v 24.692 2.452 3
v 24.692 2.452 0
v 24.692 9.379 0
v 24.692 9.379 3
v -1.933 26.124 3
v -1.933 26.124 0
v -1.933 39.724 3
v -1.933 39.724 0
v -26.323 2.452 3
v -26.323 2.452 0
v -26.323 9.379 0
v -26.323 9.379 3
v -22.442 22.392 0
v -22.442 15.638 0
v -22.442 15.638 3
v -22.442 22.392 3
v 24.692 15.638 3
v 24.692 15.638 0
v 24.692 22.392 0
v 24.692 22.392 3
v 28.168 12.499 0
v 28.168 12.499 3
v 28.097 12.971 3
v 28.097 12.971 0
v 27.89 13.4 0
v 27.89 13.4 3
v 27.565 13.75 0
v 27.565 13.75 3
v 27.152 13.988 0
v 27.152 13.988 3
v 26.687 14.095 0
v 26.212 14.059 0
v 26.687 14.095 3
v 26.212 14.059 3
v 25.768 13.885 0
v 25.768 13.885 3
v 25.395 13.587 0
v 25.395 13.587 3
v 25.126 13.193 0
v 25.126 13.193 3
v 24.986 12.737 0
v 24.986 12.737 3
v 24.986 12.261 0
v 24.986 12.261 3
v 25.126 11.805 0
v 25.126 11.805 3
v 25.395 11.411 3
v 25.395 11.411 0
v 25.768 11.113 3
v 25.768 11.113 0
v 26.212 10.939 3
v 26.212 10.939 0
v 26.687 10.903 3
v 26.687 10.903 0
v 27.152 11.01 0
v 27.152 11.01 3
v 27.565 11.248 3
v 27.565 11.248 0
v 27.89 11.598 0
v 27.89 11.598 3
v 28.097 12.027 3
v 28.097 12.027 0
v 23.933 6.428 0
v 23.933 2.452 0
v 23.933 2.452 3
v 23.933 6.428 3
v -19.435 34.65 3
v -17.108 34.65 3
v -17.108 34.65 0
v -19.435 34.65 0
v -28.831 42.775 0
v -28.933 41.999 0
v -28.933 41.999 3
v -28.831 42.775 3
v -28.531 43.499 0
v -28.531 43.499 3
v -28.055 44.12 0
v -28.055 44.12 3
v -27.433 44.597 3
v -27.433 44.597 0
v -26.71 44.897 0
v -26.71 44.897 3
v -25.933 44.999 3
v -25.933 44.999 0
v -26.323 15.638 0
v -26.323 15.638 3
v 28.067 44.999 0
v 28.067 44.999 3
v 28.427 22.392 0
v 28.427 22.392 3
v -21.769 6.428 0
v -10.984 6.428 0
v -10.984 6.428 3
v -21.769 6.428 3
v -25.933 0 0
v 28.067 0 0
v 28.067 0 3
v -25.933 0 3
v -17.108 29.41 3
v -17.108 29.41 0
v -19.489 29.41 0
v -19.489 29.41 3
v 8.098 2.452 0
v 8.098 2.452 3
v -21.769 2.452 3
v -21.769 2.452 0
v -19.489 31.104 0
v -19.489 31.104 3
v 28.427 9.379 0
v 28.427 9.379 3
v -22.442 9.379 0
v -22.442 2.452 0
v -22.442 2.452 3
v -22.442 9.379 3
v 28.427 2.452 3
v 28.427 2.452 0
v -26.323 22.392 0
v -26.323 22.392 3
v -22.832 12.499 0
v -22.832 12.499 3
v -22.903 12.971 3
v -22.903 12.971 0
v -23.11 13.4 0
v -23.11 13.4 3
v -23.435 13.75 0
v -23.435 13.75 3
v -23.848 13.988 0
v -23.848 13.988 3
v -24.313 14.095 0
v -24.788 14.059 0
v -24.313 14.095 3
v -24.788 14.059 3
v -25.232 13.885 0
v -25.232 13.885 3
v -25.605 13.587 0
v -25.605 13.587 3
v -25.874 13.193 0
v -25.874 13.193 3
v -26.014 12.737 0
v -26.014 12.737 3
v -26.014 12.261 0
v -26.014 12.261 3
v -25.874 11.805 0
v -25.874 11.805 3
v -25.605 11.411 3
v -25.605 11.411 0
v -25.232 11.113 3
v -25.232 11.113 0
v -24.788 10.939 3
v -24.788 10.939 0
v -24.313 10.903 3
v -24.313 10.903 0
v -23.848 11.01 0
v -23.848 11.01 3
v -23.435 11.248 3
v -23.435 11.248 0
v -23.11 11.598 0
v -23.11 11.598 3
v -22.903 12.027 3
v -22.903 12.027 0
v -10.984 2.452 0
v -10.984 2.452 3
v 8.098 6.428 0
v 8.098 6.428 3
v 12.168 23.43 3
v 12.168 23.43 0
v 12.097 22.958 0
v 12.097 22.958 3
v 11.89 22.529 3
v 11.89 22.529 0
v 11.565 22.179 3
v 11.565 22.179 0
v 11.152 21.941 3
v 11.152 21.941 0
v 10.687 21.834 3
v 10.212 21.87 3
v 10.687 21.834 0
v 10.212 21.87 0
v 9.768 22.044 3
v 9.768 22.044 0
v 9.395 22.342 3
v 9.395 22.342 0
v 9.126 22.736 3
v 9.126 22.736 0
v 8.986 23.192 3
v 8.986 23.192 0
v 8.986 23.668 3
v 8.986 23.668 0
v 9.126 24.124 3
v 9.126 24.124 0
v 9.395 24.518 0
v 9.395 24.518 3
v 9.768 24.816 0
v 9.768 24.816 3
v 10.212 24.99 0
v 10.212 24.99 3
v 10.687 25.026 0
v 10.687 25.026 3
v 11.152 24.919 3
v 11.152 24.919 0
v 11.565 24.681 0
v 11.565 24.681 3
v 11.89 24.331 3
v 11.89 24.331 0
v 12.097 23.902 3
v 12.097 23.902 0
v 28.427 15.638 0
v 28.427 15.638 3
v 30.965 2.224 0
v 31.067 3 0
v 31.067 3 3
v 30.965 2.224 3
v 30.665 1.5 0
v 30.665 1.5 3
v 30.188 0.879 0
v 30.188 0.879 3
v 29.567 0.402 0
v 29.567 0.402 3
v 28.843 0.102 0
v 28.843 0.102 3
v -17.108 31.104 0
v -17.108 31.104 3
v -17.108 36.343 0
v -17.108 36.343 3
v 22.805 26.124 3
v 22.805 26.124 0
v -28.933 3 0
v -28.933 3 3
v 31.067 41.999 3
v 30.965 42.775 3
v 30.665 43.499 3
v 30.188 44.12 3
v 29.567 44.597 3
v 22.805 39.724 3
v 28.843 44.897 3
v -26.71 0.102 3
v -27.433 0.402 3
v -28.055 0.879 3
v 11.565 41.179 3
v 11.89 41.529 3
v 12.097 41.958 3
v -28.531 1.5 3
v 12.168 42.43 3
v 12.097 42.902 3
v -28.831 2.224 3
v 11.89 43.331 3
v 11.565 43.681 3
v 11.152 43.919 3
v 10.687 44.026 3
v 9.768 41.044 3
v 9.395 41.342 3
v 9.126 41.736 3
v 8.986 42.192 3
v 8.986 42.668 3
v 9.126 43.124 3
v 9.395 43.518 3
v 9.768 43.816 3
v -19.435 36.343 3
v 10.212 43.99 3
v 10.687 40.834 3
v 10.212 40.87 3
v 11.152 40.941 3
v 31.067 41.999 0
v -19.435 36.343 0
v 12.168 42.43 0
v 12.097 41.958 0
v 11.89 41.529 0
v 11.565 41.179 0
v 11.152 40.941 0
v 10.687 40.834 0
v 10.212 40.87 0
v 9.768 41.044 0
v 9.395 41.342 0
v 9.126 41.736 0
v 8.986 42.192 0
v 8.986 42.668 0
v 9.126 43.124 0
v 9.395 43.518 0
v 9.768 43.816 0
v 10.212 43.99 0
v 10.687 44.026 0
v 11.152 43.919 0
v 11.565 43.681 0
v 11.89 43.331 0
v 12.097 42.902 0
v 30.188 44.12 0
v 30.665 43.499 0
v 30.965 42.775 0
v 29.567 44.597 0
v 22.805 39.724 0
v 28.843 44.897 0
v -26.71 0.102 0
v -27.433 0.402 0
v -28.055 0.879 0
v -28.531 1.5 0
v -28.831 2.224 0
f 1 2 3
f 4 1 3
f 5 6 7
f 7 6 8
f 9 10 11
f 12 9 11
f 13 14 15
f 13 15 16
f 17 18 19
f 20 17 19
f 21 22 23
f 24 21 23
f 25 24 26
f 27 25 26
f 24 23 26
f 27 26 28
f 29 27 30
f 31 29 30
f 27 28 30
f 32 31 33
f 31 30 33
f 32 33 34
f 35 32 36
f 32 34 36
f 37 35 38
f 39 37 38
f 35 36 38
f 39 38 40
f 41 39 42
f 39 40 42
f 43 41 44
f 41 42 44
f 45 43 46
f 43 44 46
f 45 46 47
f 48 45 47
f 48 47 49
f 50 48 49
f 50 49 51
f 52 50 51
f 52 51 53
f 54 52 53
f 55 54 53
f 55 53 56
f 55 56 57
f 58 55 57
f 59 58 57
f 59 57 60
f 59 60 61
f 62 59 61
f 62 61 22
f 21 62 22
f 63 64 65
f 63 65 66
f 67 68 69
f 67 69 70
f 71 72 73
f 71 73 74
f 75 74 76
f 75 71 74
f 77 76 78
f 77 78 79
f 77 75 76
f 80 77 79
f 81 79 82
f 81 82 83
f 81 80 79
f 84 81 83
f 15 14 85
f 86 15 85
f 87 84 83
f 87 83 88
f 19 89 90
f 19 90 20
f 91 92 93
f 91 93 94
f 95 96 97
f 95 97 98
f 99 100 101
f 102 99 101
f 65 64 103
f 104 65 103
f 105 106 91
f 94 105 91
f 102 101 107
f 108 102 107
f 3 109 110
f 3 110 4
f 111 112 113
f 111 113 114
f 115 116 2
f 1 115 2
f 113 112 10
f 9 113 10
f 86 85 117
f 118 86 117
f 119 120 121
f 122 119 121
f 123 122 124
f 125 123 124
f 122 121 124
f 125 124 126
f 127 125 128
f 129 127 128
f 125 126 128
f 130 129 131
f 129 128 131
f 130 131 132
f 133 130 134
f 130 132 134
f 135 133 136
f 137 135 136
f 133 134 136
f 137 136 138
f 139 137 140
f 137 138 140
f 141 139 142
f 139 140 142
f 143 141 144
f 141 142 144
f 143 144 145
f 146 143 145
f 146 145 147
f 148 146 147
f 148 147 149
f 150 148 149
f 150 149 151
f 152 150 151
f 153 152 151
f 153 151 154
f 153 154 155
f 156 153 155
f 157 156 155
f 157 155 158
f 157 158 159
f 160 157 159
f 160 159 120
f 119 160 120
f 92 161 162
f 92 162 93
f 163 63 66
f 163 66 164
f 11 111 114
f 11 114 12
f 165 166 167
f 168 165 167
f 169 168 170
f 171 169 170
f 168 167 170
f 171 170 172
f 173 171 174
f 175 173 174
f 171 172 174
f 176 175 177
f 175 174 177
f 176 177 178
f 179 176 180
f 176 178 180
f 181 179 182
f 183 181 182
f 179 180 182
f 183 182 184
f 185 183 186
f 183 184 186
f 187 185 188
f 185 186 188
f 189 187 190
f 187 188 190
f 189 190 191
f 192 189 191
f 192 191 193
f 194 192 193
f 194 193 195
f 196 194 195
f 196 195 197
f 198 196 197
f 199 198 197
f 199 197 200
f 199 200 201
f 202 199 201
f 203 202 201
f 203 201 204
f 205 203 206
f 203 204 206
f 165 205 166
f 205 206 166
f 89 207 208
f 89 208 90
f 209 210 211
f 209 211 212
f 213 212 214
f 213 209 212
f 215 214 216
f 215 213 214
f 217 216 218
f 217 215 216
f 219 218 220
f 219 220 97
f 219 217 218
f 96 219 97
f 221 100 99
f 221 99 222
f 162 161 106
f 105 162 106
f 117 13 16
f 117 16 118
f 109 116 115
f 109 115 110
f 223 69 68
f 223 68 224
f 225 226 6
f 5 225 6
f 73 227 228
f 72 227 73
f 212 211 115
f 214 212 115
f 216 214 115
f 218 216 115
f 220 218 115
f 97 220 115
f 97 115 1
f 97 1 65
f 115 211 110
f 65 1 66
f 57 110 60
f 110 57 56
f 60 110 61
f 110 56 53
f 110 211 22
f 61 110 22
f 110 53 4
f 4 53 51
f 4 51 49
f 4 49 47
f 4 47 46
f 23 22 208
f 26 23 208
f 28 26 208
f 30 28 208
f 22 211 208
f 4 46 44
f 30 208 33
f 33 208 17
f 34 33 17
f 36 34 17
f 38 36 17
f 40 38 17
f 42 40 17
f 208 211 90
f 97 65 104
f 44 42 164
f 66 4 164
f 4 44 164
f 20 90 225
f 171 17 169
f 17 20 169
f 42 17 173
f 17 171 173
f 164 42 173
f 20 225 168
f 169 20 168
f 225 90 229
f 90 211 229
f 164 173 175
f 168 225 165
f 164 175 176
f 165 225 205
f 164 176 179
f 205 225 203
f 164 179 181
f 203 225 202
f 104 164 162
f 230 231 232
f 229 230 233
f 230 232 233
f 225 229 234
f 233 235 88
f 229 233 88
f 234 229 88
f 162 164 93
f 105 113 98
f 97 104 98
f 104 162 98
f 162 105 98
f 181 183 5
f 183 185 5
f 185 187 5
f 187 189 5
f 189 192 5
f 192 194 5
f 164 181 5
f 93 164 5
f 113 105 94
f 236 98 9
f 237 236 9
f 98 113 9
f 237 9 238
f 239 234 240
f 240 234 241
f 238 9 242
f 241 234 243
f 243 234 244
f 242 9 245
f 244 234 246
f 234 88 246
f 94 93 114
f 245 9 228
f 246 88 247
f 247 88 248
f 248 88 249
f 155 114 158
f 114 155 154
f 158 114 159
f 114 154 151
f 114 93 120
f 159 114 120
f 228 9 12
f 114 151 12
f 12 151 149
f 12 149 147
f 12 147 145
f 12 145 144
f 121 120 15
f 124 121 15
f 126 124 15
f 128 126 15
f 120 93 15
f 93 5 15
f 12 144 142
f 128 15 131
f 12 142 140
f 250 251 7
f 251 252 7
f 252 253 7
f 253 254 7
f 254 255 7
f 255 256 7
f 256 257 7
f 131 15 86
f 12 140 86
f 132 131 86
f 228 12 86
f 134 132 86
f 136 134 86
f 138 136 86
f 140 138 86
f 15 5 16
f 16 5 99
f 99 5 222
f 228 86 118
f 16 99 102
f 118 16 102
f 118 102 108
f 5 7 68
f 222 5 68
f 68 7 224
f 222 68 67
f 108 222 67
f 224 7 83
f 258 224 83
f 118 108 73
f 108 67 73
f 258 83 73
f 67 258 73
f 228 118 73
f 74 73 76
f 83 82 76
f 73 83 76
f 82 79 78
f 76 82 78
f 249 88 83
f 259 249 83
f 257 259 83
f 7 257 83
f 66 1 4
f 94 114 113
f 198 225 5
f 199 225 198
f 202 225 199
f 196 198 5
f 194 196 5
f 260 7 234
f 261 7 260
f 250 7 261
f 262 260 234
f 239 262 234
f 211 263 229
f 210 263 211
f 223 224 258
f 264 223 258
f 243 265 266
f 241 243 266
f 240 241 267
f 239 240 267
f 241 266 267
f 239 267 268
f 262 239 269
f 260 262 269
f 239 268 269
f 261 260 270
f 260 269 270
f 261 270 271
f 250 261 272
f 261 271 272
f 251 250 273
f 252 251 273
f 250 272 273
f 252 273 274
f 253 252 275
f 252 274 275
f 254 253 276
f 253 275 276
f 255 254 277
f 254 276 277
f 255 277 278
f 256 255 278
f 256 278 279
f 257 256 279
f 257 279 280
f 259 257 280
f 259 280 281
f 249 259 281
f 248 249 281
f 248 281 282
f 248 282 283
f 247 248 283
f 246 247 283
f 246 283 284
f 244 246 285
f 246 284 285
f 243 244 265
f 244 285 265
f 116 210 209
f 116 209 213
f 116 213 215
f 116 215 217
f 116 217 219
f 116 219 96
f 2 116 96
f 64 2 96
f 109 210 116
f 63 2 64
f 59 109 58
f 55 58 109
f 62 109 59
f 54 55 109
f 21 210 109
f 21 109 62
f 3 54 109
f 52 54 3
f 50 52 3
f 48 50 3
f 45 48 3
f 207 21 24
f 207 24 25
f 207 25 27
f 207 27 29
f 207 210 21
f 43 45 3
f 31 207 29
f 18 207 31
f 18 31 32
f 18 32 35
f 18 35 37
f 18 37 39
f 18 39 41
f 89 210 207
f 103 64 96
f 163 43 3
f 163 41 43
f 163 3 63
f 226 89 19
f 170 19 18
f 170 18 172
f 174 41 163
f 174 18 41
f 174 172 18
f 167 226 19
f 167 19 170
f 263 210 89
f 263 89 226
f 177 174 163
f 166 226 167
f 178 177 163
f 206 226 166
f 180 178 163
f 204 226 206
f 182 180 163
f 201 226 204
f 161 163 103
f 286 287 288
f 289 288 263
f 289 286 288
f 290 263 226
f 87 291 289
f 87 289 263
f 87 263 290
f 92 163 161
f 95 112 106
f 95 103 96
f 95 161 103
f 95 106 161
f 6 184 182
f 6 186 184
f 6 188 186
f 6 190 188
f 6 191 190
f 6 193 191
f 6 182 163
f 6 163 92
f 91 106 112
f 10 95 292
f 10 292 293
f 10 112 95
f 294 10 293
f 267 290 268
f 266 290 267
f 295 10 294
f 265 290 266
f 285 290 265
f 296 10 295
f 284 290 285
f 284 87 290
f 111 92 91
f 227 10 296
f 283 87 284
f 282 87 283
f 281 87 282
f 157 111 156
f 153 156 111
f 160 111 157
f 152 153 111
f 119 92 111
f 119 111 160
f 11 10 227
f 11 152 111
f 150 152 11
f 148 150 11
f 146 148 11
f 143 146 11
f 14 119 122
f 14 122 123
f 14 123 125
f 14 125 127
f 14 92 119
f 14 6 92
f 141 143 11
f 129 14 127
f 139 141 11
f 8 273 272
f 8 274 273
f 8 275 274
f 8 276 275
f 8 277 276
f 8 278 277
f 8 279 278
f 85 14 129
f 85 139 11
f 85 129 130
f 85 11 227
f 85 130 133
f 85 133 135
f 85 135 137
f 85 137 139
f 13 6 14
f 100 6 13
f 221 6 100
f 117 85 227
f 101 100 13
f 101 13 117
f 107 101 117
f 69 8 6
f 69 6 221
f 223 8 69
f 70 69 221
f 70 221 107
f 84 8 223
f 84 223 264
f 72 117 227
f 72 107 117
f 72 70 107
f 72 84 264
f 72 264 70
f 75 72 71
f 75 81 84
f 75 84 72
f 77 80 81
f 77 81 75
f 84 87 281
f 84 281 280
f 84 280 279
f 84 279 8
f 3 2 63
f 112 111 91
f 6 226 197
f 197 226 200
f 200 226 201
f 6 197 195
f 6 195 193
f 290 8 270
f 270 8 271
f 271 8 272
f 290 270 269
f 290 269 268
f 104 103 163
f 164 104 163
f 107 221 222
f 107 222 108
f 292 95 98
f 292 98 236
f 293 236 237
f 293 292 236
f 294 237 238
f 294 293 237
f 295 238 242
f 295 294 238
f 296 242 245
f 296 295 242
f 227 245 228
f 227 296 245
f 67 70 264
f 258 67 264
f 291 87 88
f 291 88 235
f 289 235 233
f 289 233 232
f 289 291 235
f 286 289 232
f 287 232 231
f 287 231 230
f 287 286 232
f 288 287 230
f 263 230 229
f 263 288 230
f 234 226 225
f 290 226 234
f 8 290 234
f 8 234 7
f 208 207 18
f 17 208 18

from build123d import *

# Parameters (mm, degrees)
SKETCH_1_R          = 1.35
SKETCH_1_R_2        = 1.6
SKETCH_1_W          = 10.785023523
SKETCH_1_H          = 3.975869969
SKETCH_1_W_2        = 3.881137471
SKETCH_1_H_2        = 6.926362959
SKETCH_1_H_3        = 6.753909589
SKETCH_1_W_3        = 2.381
SKETCH_1_H_4        = 1.694
SKETCH_1_W_4        = 2.327
SKETCH_1_H_5        = 1.693
SKETCH_1_W_5        = 24.737091535
SKETCH_1_H_6        = 13.600314953
SKETCH_1_W_6        = 15.83465493
SKETCH_1_W_7        = 3.735479659
EXTRUDE_1_DEPTH     = 3
SKETCH_2_R          = 1.6
CUT_EXTRUDE_1_DEPTH = 55.763647529


with BuildPart() as part:
    # 草图1 → 凸台-拉伸1 (new body)
    with BuildSketch(Plane(origin=(0, 0, 0), x_dir=(-1, 0, 0), z_dir=(0, 0, -1))):
        with BuildLine():
            Line((28.933183464, 3), (28.933183464, 41.999))
            ThreePointArc((28.933183464, 41.999), (28.054503808, 44.120320344), (25.933183464, 44.999))
            Line((25.933183464, 44.999), (-28.066816536, 44.999))
            ThreePointArc((-28.066816536, 44.999), (-30.18813688, 44.120320344), (-31.066816536, 41.999))
            Line((-31.066816536, 41.999), (-31.066816536, 3))
            ThreePointArc((-31.066816536, 3), (-30.18813688, 0.878679656), (-28.066816536, 0))
            Line((-28.066816536, 0), (25.933183464, 0))
            ThreePointArc((25.933183464, 0), (28.054503808, 0.878679656), (28.933183464, 3))
        make_face()
        with Locations(Location((-26.567767322, 12.499, 0), (0, 0, 180))):
            Circle(SKETCH_1_R, mode=Mode.SUBTRACT)
        with Locations(Location((-10.567816536, 23.43, 0), (0, 0, 180))):
            Circle(SKETCH_1_R_2, mode=Mode.SUBTRACT)
        with Locations(Location((24.432183464, 12.499, 0), (0, 0, 180))):
            Circle(SKETCH_1_R, mode=Mode.SUBTRACT)
        with Locations(Location((-10.567816536, 42.43, 0), (0, 0, 180))):
            Circle(SKETCH_1_R_2, mode=Mode.SUBTRACT)
        with Locations((16.376273559, 4.440236649)):
            Rectangle(SKETCH_1_W, SKETCH_1_H, mode=Mode.SUBTRACT)
        with Locations((24.382587874, 5.915483144)):
            Rectangle(SKETCH_1_W_2, SKETCH_1_H_2, mode=Mode.SUBTRACT)
        with Locations((24.382587874, 19.014796064)):
            Rectangle(SKETCH_1_W_2, SKETCH_1_H_3, mode=Mode.SUBTRACT)
        with Locations((18.298683464, 30.257)):
            Rectangle(SKETCH_1_W_3, SKETCH_1_H_4, mode=Mode.SUBTRACT)
        with Locations((18.271683464, 35.4965)):
            Rectangle(SKETCH_1_W_4, SKETCH_1_H_5, mode=Mode.SUBTRACT)
        with Locations((-10.43601502, 32.923896791)):
            Rectangle(SKETCH_1_W_5, SKETCH_1_H_6, mode=Mode.SUBTRACT)
        with Locations((-16.015517123, 4.440236649)):
            Rectangle(SKETCH_1_W_6, SKETCH_1_H, mode=Mode.SUBTRACT)
        with Locations((-26.559738671, 5.915483144)):
            Rectangle(SKETCH_1_W_7, SKETCH_1_H_2, mode=Mode.SUBTRACT)
        with Locations((-26.559738671, 19.014796064)):
            Rectangle(SKETCH_1_W_7, SKETCH_1_H_3, mode=Mode.SUBTRACT)
    extrude(amount=-EXTRUDE_1_DEPTH)

    # 草图2 → 切除-拉伸1 (cut, through all)
    with BuildSketch(Plane.XY.offset(3)):
        with Locations((-24.432183464, 12.499)):
            Circle(SKETCH_2_R)
        with Locations((26.567767322, 12.499)):
            Circle(SKETCH_2_R)
    extrude(amount=-CUT_EXTRUDE_1_DEPTH, mode=Mode.SUBTRACT)


solid = part.part
